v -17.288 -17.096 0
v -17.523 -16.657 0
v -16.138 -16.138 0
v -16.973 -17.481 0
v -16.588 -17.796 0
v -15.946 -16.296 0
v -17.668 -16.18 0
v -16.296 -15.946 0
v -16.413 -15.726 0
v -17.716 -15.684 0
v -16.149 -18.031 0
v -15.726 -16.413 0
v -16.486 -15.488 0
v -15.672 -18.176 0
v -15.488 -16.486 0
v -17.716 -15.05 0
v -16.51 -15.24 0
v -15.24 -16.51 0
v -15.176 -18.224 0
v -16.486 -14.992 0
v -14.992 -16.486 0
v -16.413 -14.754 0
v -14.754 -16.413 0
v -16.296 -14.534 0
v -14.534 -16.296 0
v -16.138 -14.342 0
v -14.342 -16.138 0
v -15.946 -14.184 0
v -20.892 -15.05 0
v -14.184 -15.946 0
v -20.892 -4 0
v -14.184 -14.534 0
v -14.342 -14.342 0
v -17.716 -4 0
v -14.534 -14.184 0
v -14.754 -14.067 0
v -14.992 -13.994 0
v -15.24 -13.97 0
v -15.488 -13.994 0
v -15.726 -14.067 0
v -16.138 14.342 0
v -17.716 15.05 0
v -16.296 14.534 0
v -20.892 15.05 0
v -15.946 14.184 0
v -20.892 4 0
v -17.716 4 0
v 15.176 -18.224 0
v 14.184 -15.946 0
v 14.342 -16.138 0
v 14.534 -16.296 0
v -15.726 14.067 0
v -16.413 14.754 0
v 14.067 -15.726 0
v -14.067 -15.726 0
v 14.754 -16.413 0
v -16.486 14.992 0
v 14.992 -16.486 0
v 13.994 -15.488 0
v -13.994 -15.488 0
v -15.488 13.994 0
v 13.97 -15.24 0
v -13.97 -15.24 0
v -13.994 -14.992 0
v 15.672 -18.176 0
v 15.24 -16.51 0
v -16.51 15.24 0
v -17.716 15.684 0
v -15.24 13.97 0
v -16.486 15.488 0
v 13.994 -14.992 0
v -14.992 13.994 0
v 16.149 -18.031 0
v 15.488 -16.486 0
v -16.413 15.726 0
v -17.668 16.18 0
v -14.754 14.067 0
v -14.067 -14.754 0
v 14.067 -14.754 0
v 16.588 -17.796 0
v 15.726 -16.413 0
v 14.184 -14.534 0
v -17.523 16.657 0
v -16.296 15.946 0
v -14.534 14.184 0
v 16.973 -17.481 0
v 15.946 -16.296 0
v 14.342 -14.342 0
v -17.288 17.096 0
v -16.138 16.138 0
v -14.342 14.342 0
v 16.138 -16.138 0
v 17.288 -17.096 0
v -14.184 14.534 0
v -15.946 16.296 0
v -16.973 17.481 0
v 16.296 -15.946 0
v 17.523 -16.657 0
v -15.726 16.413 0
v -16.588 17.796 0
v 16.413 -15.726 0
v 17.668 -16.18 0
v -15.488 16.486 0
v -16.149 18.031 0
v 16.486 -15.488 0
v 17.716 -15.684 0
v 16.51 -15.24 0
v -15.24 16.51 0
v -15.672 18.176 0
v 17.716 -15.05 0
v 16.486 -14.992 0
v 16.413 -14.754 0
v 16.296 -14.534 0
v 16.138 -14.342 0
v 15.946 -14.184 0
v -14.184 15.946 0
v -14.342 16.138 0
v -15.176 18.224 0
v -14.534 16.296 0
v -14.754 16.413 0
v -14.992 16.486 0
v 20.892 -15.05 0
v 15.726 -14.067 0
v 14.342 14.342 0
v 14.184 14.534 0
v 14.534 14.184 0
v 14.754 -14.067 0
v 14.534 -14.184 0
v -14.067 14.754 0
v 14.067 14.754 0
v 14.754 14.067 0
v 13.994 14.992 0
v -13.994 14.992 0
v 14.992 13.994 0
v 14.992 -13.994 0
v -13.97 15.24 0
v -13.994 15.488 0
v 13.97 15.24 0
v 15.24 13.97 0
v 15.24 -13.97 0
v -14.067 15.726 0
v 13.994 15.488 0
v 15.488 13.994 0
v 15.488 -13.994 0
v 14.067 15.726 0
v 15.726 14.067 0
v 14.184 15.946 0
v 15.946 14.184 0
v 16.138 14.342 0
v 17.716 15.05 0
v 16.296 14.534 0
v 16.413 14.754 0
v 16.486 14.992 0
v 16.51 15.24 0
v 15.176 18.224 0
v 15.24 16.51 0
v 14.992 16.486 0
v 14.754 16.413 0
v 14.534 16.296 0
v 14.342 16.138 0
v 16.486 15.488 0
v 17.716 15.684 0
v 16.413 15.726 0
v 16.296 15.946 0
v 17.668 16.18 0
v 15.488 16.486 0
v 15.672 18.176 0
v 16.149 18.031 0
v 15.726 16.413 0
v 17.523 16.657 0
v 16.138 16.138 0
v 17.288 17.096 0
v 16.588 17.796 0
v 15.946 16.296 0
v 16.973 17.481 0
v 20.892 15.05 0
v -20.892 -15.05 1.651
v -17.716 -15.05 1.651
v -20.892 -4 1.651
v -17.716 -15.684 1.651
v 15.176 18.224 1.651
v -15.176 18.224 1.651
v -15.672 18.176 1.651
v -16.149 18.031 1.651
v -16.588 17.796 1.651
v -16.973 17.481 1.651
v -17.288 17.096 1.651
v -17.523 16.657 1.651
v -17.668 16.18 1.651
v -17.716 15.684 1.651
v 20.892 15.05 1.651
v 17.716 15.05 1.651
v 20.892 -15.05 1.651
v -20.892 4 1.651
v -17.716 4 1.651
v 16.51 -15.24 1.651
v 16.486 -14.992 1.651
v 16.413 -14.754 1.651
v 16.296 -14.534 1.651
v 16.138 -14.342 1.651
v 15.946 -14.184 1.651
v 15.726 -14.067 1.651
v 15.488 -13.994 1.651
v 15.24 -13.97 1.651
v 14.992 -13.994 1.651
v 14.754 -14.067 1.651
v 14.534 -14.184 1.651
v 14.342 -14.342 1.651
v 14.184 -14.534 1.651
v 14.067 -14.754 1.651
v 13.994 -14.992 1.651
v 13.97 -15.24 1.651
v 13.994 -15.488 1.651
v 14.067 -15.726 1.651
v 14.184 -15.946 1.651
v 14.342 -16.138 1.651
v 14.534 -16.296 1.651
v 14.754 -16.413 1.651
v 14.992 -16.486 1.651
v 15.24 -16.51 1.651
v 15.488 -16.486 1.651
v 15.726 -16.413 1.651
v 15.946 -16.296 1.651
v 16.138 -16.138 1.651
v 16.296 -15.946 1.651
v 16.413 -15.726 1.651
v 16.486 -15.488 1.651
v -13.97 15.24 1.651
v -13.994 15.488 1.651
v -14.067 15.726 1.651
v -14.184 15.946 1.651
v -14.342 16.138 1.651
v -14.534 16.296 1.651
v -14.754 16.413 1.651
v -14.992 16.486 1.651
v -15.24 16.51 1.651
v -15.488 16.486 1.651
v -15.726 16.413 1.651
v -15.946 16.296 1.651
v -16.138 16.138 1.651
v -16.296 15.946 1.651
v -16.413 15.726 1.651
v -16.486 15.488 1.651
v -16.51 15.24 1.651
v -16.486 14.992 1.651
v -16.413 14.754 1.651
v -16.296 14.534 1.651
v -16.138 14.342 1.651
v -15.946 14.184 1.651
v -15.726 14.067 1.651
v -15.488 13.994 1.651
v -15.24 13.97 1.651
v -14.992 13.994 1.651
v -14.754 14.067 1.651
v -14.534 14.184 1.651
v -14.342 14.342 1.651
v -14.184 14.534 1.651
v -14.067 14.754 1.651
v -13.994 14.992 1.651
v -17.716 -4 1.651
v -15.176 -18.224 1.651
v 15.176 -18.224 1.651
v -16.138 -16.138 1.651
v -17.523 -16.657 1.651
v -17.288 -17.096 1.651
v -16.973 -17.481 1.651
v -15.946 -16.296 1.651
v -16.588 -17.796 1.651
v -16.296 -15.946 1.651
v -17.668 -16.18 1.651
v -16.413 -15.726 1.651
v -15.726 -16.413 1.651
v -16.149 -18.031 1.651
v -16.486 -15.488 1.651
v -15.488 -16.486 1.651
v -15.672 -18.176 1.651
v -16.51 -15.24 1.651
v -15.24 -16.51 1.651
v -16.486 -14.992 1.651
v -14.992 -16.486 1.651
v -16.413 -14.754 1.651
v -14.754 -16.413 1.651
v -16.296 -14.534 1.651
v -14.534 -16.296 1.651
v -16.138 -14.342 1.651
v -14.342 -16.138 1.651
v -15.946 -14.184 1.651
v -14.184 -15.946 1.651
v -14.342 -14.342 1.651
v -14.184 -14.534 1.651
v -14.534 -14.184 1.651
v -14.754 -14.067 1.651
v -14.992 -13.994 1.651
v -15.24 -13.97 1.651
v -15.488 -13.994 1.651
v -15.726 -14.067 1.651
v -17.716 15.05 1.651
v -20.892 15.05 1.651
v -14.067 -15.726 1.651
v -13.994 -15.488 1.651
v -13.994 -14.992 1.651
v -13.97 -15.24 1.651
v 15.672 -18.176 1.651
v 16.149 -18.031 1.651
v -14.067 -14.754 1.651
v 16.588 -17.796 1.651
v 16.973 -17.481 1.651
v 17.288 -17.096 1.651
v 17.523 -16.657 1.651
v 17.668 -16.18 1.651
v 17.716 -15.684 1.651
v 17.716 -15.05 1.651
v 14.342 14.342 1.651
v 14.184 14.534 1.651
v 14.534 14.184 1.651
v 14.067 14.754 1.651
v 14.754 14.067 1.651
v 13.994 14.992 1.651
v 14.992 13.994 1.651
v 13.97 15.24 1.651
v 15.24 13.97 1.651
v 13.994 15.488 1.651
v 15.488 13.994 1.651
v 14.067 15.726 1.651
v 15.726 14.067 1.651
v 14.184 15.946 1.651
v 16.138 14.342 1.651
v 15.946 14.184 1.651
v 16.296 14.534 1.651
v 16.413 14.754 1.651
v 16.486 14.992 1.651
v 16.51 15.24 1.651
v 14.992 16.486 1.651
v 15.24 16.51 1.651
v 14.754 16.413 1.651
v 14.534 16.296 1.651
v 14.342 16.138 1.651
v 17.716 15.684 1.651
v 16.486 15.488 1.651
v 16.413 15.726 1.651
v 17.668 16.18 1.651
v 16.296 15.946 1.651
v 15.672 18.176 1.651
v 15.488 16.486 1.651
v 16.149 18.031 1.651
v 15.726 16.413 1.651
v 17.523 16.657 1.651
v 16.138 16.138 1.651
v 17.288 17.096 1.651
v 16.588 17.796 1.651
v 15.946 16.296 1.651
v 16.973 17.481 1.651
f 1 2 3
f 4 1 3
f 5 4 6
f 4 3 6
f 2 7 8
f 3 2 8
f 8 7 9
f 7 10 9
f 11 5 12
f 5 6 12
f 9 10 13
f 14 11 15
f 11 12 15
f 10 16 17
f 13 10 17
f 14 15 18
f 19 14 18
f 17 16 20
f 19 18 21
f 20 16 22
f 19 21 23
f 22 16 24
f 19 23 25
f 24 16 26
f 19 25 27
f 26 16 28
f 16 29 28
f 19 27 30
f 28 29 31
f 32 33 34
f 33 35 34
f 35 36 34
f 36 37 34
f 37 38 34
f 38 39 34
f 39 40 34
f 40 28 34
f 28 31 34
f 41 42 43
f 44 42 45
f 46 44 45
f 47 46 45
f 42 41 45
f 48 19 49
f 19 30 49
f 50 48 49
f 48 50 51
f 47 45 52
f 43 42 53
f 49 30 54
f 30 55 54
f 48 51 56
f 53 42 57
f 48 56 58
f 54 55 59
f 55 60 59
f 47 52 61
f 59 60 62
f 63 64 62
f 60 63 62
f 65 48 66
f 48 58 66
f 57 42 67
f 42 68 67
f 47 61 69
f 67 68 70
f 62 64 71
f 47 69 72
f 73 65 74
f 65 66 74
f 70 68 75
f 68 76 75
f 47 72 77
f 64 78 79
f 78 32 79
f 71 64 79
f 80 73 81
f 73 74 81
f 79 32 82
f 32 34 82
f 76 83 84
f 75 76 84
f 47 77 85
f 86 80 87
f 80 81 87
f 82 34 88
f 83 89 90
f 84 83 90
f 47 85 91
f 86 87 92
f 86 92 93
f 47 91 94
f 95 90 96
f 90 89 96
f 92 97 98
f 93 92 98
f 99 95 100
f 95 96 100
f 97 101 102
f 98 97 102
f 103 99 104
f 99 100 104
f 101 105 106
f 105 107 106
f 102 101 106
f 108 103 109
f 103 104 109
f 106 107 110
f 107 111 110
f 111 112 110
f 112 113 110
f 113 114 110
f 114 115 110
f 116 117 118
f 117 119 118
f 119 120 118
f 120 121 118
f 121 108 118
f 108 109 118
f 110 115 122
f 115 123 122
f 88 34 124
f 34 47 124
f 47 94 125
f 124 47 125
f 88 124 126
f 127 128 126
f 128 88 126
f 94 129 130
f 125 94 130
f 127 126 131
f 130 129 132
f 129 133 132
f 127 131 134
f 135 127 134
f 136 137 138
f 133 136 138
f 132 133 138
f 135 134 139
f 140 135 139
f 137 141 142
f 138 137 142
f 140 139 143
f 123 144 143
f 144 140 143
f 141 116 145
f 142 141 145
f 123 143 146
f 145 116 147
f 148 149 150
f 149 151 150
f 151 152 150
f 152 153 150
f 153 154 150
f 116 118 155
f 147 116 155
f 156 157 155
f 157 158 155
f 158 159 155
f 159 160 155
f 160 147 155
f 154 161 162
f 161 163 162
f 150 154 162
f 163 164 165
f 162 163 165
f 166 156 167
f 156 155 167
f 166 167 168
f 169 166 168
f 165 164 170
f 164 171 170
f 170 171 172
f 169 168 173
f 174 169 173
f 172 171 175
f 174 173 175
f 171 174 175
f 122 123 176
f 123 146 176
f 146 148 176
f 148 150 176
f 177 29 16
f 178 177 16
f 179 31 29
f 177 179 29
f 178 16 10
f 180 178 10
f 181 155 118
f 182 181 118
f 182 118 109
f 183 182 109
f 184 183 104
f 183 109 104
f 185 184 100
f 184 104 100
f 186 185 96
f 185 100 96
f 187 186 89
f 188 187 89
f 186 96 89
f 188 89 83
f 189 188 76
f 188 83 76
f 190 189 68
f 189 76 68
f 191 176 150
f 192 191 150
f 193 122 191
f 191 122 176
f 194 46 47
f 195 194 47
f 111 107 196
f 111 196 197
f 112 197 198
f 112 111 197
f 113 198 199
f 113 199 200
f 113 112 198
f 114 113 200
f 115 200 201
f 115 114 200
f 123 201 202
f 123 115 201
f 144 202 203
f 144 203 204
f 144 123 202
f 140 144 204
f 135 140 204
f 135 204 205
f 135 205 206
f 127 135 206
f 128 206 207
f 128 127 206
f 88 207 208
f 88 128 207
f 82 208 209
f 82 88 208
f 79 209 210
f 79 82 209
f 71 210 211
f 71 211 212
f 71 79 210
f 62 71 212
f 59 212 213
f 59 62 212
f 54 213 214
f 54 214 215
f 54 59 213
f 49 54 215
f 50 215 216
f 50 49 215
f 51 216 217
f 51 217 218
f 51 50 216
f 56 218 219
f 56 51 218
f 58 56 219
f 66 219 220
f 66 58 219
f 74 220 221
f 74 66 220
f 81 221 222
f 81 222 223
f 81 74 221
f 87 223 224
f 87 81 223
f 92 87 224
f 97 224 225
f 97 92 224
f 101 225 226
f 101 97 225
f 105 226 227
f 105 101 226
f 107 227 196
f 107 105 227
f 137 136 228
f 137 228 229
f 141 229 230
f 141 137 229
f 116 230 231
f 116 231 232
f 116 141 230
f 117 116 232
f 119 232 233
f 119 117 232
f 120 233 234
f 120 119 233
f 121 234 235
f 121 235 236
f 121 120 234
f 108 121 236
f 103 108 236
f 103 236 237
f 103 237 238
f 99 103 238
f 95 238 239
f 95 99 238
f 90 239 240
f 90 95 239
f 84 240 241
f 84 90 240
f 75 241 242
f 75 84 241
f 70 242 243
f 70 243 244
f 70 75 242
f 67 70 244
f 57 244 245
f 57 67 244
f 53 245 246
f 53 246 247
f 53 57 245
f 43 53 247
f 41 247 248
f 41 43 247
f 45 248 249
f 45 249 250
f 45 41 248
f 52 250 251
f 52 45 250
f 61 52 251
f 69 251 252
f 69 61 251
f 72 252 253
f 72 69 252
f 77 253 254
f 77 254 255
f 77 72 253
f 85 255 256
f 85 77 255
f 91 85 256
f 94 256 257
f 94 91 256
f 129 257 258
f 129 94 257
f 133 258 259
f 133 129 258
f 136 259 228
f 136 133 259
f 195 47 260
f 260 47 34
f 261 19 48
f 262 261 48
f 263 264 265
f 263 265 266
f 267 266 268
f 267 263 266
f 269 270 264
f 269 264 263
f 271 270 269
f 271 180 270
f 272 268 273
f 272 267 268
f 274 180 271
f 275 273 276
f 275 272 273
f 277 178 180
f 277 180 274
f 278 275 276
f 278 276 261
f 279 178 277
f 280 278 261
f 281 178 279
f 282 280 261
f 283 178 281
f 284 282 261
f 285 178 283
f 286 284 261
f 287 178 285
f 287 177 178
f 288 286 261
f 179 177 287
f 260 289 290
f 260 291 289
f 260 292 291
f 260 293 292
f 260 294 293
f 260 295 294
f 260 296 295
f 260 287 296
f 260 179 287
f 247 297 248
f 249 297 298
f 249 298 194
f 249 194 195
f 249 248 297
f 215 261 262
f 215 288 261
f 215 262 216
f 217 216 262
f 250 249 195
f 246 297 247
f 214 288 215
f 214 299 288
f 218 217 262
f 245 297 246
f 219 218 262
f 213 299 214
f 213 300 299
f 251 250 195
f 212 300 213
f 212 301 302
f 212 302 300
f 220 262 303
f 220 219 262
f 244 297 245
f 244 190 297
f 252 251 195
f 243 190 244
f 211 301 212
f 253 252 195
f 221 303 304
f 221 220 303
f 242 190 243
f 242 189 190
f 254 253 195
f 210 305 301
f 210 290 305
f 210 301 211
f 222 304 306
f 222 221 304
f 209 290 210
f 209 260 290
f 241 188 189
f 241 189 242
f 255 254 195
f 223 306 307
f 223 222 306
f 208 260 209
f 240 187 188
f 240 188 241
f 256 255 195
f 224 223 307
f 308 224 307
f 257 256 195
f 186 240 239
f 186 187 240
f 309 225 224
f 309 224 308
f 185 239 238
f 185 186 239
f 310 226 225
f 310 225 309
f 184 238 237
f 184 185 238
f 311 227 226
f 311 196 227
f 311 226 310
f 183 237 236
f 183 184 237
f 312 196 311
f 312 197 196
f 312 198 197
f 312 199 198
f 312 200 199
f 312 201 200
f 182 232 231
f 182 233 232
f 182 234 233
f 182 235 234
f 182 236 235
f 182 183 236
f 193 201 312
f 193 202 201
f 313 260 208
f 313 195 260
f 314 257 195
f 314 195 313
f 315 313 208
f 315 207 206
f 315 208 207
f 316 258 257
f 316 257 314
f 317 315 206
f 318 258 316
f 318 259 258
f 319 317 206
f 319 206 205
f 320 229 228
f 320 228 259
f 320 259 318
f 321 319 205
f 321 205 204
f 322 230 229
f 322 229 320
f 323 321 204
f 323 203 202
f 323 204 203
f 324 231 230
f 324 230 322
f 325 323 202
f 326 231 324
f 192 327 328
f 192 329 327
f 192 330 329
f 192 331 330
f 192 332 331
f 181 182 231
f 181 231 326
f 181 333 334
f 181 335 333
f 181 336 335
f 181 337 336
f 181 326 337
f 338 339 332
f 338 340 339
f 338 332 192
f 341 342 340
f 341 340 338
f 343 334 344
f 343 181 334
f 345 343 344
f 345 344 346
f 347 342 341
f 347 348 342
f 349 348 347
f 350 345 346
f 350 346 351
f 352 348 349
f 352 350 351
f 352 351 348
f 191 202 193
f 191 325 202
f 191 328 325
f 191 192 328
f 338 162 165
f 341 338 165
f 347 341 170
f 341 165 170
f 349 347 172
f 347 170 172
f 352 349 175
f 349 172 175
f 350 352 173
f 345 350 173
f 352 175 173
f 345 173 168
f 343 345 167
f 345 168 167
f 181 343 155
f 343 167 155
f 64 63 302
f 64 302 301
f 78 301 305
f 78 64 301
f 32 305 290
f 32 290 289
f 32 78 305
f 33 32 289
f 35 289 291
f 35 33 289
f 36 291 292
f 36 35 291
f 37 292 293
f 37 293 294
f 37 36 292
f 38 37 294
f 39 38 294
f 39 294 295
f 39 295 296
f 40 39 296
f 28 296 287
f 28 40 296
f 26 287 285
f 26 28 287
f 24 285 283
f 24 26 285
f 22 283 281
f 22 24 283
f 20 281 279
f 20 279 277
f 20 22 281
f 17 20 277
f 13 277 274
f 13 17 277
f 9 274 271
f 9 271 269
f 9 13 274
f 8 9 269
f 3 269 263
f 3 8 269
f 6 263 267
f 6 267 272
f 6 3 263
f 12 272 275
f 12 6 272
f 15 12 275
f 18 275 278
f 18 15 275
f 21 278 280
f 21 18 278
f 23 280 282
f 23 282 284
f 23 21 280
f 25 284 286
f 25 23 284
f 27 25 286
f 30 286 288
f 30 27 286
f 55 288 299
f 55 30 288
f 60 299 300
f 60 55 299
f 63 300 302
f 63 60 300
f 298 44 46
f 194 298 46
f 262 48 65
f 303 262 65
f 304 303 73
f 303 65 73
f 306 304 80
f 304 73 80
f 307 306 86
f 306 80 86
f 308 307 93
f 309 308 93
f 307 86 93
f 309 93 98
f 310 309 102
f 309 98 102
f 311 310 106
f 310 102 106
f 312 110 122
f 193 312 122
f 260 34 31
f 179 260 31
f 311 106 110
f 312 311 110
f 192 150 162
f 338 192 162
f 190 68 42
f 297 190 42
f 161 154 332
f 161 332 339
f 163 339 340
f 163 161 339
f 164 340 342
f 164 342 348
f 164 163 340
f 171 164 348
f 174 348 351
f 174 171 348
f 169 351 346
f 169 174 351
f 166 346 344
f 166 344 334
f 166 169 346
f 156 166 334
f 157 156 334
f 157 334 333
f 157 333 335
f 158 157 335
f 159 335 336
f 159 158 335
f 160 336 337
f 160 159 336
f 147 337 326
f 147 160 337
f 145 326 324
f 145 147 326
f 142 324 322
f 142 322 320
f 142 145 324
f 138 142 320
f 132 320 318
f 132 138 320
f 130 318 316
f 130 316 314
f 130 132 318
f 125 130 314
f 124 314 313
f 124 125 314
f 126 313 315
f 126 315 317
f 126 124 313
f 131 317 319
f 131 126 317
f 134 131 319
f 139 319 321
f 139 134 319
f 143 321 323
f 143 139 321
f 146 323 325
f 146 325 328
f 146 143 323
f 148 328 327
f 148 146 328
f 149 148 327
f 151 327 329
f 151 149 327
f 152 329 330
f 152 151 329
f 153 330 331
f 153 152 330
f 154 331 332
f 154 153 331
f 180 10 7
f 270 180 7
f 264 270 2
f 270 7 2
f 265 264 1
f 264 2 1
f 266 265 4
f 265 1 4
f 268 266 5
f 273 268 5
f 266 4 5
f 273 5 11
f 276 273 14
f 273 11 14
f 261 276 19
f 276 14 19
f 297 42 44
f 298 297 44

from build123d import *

# Parameters (mm, degrees)
F0_R     = 1.27
F1_DEPTH = 1.651


with BuildPart() as f1:
    # F0 (on Top) → F1 (new body)
    with BuildSketch(Plane.XY):
        with BuildLine():
            Line((-15.1765, -18.2245), (15.1765, -18.2245))
            ThreePointArc((15.1765, -18.2245), (16.972551, -17.480551), (17.7165, -15.6845))
            Line((17.7165, -15.6845), (17.7165, -15.0495))
            Line((17.7165, -15.0495), (20.8915, -15.0495))
            Line((20.8915, -15.0495), (20.8915, 15.0495))
            Line((20.8915, 15.0495), (17.7165, 15.0495))
            Line((17.7165, 15.0495), (17.7165, 15.6845))
            ThreePointArc((17.7165, 15.6845), (16.972551, 17.480551), (15.1765, 18.2245))
            Line((15.1765, 18.2245), (-15.1765, 18.2245))
            ThreePointArc((-15.1765, 18.2245), (-16.972551, 17.480551), (-17.7165, 15.6845))
            Line((-17.7165, 15.6845), (-17.7165, 15.0495))
            Line((-17.7165, 15.0495), (-20.8915, 15.0495))
            Line((-20.8915, 15.0495), (-20.8915, 4.0005))
            Line((-20.8915, 4.0005), (-17.7165, 4.0005))
            Line((-17.7165, 4.0005), (-17.7165, -4.0005))
            Line((-17.7165, -4.0005), (-20.8915, -4.0005))
            Line((-20.8915, -4.0005), (-20.8915, -15.0495))
            Line((-20.8915, -15.0495), (-17.7165, -15.0495))
            Line((-17.7165, -15.0495), (-17.7165, -15.6845))
            ThreePointArc((-17.7165, -15.6845), (-16.972551, -17.480551), (-15.1765, -18.2245))
        make_face()
        with Locations((-15.24, -15.24)):
            Circle(F0_R, mode=Mode.SUBTRACT)
        with Locations((15.24, -15.24)):
            Circle(F0_R, mode=Mode.SUBTRACT)
        with Locations((-15.24, 15.24)):
            Circle(F0_R, mode=Mode.SUBTRACT)
        with Locations((15.24, 15.24)):
            Circle(F0_R, mode=Mode.SUBTRACT)
    extrude(amount=F1_DEPTH)


solid = f1.part
